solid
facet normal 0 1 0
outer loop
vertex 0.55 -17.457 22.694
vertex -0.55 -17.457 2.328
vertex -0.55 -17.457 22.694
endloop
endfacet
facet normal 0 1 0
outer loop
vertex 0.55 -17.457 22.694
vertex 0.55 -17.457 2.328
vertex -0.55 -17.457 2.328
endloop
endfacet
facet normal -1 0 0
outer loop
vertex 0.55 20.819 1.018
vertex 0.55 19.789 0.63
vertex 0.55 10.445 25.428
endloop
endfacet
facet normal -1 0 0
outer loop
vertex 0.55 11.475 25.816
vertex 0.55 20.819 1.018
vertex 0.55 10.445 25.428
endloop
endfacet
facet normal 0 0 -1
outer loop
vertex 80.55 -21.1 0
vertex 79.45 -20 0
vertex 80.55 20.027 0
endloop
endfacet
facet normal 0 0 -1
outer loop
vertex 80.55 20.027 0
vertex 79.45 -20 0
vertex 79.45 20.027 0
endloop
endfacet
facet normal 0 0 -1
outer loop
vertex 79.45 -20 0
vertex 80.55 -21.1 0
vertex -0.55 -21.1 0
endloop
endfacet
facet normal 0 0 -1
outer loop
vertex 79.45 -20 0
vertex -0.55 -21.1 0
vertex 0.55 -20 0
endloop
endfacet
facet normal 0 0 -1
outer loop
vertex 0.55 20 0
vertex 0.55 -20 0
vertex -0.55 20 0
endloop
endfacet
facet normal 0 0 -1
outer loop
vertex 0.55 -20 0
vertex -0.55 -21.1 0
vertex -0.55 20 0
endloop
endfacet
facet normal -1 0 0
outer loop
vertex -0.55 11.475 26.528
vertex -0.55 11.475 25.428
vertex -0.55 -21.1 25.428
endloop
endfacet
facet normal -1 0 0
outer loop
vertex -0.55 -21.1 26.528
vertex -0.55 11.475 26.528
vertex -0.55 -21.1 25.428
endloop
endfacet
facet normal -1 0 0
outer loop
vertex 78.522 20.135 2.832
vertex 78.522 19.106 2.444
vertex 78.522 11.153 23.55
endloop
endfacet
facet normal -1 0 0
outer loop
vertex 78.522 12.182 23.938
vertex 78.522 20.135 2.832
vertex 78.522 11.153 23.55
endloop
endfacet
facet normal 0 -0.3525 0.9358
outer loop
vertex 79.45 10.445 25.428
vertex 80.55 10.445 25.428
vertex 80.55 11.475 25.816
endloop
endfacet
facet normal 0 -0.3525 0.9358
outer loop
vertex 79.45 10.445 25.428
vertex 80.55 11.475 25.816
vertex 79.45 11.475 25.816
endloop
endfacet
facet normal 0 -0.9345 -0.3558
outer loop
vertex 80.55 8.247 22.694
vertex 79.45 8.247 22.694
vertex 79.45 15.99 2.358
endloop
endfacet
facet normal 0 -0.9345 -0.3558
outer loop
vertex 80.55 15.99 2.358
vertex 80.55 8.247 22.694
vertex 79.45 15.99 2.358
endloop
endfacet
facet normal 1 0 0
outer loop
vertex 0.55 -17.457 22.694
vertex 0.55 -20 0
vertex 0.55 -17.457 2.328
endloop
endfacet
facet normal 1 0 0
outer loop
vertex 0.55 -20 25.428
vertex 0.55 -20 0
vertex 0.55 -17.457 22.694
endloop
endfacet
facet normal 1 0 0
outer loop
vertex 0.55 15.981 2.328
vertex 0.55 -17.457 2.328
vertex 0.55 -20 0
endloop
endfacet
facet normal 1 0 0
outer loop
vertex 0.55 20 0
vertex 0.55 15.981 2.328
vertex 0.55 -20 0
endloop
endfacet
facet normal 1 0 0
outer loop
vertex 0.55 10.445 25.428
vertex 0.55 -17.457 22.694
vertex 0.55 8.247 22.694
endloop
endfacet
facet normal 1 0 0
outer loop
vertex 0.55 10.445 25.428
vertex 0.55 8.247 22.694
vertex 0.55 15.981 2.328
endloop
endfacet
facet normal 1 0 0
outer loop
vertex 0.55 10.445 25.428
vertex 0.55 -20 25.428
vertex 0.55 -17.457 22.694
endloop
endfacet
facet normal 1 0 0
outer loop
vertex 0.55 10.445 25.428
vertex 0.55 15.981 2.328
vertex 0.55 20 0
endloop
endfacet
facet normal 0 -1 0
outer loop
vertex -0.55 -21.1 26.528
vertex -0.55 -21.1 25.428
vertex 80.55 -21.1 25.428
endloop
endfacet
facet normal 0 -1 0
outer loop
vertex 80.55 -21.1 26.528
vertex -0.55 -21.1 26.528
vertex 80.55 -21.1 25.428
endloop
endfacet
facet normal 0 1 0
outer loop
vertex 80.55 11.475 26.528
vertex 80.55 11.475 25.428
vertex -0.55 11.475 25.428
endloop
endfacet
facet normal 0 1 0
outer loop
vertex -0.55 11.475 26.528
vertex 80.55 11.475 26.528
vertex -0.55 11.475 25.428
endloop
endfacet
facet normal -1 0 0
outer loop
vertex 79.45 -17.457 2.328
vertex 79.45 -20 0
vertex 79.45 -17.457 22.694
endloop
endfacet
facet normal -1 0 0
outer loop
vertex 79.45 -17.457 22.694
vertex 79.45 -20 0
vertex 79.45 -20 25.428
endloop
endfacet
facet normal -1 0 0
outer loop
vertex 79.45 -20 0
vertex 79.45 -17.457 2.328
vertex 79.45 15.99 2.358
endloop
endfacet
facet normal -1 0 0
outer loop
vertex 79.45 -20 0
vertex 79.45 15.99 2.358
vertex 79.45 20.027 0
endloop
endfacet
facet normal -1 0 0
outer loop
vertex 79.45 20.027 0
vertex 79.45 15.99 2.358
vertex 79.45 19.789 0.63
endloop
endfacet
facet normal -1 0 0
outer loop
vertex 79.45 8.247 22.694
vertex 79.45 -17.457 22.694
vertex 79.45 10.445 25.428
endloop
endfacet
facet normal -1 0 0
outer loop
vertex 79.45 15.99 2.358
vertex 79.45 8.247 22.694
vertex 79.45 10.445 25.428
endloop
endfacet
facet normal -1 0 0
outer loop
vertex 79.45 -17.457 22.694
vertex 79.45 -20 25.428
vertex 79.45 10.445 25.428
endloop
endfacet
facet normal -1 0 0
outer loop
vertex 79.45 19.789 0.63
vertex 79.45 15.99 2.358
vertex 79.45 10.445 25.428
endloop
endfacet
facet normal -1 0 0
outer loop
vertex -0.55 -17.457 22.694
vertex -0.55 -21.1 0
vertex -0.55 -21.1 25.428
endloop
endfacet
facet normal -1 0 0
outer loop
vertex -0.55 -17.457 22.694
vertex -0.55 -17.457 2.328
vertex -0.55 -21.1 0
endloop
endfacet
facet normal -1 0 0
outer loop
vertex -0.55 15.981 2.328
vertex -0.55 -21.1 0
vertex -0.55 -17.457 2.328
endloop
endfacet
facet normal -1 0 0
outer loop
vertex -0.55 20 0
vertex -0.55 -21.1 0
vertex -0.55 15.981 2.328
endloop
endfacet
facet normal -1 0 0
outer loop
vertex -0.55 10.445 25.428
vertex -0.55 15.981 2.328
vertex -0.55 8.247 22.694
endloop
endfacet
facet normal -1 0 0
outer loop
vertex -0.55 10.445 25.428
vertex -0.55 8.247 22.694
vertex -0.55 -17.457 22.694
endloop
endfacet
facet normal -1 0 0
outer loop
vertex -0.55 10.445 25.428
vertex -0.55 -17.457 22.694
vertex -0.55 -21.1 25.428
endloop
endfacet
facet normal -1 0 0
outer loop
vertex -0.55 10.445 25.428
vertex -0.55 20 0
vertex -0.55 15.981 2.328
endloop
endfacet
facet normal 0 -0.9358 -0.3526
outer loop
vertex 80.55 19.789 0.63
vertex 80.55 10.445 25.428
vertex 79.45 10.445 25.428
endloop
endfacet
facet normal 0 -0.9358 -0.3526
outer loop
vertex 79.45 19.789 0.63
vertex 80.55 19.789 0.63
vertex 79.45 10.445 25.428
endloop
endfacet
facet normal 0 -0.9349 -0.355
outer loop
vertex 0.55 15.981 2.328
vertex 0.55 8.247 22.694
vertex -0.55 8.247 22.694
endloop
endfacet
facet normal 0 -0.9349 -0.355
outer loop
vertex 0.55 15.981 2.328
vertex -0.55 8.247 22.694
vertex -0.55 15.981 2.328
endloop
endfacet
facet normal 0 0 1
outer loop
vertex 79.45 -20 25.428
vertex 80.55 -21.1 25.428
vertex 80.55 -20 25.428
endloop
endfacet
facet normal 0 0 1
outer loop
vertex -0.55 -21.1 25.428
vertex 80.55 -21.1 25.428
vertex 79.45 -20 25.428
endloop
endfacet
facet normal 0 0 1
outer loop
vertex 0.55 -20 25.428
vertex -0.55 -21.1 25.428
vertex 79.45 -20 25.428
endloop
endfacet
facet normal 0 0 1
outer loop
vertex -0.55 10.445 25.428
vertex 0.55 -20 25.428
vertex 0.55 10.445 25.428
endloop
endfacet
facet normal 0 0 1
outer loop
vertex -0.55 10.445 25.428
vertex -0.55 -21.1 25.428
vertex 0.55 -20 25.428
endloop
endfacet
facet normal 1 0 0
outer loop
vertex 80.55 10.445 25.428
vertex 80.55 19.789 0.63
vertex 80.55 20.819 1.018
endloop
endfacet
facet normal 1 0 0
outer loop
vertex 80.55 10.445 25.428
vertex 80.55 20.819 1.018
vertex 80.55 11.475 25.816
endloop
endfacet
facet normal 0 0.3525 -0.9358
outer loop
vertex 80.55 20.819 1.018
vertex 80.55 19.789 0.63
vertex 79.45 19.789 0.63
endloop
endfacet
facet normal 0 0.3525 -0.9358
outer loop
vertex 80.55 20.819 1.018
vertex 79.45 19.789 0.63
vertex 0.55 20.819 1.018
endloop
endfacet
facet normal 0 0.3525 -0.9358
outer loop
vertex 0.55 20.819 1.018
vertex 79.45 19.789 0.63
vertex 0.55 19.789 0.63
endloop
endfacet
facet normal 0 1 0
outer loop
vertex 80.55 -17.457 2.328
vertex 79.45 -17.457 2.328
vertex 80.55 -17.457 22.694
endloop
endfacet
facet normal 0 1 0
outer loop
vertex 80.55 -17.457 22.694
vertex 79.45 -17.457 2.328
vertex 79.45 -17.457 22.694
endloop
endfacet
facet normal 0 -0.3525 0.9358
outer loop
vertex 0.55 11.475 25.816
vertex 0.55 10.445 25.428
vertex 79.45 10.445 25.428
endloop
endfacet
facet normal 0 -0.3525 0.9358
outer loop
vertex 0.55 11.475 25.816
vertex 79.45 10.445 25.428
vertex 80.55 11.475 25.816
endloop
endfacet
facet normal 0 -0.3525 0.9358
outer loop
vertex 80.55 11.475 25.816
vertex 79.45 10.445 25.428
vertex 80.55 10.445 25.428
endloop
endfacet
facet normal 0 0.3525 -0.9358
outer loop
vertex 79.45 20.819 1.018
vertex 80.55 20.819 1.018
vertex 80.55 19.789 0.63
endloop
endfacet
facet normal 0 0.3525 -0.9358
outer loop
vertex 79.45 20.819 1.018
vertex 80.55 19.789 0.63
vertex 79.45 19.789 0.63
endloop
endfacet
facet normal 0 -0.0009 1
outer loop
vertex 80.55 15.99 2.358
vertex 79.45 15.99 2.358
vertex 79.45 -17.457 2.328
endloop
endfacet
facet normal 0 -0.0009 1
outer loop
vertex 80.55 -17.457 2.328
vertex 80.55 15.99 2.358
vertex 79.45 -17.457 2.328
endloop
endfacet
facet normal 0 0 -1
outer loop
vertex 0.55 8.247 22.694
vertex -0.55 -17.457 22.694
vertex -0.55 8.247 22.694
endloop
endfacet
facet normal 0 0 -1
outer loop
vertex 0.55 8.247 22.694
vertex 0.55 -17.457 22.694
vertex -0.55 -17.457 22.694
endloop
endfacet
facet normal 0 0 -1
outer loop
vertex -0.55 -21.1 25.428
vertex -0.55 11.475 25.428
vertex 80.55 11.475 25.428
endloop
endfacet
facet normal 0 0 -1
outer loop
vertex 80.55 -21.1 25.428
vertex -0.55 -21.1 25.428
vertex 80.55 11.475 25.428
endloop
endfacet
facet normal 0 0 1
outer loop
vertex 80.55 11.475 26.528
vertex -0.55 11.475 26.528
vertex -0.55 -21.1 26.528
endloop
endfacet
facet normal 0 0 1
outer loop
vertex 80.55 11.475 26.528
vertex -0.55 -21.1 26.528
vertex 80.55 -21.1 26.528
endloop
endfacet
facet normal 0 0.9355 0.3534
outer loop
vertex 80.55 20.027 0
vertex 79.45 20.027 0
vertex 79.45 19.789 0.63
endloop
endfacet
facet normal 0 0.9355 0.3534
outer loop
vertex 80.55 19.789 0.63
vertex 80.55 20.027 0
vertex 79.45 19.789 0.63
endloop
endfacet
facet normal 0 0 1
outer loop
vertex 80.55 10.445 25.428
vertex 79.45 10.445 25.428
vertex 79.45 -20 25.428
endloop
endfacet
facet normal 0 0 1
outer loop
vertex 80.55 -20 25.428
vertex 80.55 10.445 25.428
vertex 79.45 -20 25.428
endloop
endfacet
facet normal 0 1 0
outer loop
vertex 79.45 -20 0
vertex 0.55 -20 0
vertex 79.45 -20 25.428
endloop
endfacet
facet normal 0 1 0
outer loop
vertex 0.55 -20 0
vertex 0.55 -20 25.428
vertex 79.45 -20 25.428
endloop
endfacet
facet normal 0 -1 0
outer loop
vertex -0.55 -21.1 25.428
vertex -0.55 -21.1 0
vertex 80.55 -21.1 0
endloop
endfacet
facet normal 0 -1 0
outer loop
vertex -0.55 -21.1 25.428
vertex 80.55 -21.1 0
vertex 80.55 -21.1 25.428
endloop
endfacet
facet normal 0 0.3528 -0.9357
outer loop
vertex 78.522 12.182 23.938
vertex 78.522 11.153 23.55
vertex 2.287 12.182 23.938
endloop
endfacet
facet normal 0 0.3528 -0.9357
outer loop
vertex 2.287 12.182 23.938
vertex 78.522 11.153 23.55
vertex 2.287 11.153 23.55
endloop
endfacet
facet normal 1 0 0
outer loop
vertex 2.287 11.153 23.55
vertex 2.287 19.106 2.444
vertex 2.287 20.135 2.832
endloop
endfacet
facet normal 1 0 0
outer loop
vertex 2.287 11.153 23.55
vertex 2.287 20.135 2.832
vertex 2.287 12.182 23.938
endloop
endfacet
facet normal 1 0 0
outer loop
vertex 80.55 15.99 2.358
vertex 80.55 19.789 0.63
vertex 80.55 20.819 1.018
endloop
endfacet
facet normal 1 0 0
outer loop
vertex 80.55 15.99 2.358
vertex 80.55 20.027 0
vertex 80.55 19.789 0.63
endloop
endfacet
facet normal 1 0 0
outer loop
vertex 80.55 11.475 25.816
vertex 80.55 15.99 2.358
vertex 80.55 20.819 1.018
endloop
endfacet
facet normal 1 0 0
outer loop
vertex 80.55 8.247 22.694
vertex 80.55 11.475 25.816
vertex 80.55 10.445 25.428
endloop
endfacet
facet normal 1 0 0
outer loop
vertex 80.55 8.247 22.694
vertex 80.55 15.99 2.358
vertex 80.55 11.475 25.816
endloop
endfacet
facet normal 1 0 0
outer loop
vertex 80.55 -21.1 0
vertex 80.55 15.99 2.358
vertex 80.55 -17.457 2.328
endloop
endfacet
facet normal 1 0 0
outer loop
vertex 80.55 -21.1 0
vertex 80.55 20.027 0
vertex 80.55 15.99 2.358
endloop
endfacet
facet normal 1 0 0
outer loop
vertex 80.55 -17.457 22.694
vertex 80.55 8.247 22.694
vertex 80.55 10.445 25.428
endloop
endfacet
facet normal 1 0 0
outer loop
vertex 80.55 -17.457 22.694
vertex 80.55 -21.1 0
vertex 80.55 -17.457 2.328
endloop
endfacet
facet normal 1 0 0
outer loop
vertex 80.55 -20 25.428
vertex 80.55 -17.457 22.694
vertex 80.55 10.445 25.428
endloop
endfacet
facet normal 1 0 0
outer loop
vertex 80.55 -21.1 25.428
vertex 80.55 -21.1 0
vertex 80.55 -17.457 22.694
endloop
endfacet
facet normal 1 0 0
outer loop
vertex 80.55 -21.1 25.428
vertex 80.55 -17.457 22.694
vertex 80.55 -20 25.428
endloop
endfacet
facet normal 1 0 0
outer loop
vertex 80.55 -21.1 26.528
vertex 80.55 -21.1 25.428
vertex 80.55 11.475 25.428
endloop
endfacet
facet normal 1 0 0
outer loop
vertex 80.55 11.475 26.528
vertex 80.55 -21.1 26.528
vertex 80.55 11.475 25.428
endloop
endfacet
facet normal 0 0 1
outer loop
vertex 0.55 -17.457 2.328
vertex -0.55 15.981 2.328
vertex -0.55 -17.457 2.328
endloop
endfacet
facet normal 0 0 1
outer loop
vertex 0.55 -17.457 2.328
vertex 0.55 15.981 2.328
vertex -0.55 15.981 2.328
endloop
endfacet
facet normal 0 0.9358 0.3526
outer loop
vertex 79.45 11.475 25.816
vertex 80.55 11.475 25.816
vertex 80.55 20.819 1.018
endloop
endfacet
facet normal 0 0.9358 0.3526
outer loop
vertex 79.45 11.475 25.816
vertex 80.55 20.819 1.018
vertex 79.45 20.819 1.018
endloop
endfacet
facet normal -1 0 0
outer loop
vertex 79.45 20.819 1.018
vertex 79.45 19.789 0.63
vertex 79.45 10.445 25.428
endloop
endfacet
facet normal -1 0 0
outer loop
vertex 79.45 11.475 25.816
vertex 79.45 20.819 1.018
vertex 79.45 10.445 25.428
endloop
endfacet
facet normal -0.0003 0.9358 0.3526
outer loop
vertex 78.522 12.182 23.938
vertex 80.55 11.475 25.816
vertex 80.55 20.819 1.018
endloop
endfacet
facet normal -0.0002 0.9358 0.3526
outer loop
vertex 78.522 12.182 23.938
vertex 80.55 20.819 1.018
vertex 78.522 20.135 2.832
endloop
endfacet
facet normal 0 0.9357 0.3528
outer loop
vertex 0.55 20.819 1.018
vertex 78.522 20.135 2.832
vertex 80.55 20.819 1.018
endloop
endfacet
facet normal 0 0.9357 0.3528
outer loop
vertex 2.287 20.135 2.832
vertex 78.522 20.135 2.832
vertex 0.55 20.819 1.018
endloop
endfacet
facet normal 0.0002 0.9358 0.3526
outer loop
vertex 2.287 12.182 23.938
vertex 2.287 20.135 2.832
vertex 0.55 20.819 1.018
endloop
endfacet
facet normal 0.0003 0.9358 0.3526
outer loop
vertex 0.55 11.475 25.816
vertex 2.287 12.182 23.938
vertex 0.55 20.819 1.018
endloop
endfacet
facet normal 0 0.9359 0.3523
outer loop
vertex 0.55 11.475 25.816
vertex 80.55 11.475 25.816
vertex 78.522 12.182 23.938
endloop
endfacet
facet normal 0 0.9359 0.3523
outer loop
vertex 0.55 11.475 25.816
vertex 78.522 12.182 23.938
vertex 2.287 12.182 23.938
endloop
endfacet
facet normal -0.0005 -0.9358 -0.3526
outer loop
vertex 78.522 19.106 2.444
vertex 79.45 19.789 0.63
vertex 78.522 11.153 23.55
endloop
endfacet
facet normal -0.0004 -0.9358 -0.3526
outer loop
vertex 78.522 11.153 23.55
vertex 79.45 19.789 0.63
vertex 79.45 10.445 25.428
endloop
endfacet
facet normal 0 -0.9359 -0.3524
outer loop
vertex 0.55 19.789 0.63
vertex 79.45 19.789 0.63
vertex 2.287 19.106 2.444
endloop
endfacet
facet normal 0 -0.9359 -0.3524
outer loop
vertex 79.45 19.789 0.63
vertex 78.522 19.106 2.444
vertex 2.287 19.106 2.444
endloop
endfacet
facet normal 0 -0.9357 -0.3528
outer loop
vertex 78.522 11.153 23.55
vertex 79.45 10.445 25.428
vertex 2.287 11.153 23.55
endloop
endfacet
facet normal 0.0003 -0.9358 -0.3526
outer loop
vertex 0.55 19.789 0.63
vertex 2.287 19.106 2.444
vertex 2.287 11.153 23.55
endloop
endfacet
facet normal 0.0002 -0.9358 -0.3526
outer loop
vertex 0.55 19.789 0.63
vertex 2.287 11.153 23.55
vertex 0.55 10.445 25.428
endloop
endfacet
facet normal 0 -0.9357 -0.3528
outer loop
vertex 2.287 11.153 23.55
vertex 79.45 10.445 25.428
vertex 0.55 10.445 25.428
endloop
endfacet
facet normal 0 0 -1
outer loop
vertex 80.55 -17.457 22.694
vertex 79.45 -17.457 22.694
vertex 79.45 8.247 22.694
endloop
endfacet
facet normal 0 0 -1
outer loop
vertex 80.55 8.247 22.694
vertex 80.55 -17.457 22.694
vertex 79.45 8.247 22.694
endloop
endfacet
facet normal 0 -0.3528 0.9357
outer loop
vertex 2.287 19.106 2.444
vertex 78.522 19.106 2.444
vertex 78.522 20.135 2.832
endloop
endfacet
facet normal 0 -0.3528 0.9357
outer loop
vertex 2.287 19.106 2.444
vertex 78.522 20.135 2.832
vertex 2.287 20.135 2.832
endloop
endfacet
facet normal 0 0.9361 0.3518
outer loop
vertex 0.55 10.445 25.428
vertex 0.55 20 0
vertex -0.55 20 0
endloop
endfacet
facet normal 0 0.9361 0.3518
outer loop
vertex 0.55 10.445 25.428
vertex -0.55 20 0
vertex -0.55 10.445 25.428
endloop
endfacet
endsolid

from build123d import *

# Parameters (mm, degrees)
F1_DEPTH  = 0.55
F2_W      = 78.9
F2_H      = 25.4280829926
F2_W_2    = 1.1
F3_DEPTH  = 1.1
F4_W      = 1.1
F4_H      = 25.4280829926
F5_DEPTH  = 1.1
F6_W      = 78.9
F6_H      = 26.5003892772
F6_W_2    = 76.2348438147
F6_H_2    = 22.5544893183
F6_W_3    = 1.1
F7_DEPTH  = 1.1
F8_DEPTH  = 1.1
F10_DEPTH = 1.1


# Not quite as in the source:
# - ends of sketch curves that miss each other by under 0.0002 mm in the source are joined
# - a feature names something its author has since deleted; it is built from what else it names


with BuildPart() as f1:
    # F0 (on Right) → F1 (new body, symmetric)
    with BuildSketch(Plane.YZ):
        Polygon((-20, 25.4280829926), (-20, 0), (-0.7378033123, 0), (0, 0), (20, 0), (10.4452063715, 25.4280829926), align=None)
        Polygon((8.2472184154, 22.693965584), (15.9812862531, 2.3275862914), (-17.4568928778, 2.3275862914), (-17.4568928778, 22.693965584), align=None, mode=Mode.SUBTRACT)
    extrude(amount=F1_DEPTH, both=True)

    # F2 (on face) → F3 (join)
    with BuildSketch(Plane.XZ.offset(20)):
        with Locations((40, 12.7140414963)):
            Rectangle(F2_W, F2_H)
        with Locations((0, 12.7140414963)):
            Rectangle(F2_W_2, F2_H)
    extrude(amount=F3_DEPTH)

    # F4 (on face) → F5 (join)
    with BuildSketch(Plane.YZ.offset(79.45)):
        Polygon((-20, 25.4280829926), (-20, 0), (0, 0), (20.0266968459, 0), (10.4452678934, 25.4279654473), align=None)
        Polygon((8.2472153008, 22.6938780397), (15.9903429449, 2.3578198161), (-17.4568258226, 2.3277304135), (-17.4568258226, 22.6938780397), align=None, mode=Mode.SUBTRACT)
        with Locations((-20.55, 12.7140414963)):
            Rectangle(F4_W, F4_H)
    extrude(amount=F5_DEPTH)

    # F6 (on face) → F7 (join)
    with BuildSketch(Plane(origin=(0, 17.5367681908, 6.6079725814), x_dir=(-1, 0, 0), z_dir=(0, 0.9357721565, 0.3526052626))):
        with Locations((-40, 6.8615309945)):
            Rectangle(F6_W, F6_H)
        with Locations((-40.4041948495, 6.8278673571)):
            Rectangle(F6_W_2, F6_H_2, mode=Mode.SUBTRACT)
        with Locations((-80, 6.8615309945)):
            Rectangle(F6_W_3, F6_H)
    extrude(amount=F7_DEPTH)


with BuildPart() as f8:
    # F6 (on face) → F8 (new body)
    with BuildSketch(Plane(origin=(0, 17.5367681908, 6.6079725814), x_dir=(-1, 0, 0), z_dir=(0, 0.9357721565, 0.3526052626))):
        with Locations((-80, 6.8615309945)):
            Rectangle(F6_W_3, F6_H)
    extrude(amount=F8_DEPTH)


with BuildPart() as f10:
    # F9 (on face) → F10 (new body)
    with BuildSketch(Plane.XY.offset(25.4280829926)):
        Polygon((79.45, -20), (80.55, -20), (80.55, 11.4747500047), (-0.55, 11.4747500047), (-0.55, 10.4452063715), (0.55, 10.4452063715), (0.55, -20), align=None)
        Polygon((-0.55, -21.1), (80.55, -21.1), (80.55, -20), (79.45, -20), (0.55, -20), (0.55, 10.4452063715), (-0.55, 10.4452063715), align=None)
    extrude(amount=F10_DEPTH)


solid = Compound([f1.part, f8.part, f10.part])
